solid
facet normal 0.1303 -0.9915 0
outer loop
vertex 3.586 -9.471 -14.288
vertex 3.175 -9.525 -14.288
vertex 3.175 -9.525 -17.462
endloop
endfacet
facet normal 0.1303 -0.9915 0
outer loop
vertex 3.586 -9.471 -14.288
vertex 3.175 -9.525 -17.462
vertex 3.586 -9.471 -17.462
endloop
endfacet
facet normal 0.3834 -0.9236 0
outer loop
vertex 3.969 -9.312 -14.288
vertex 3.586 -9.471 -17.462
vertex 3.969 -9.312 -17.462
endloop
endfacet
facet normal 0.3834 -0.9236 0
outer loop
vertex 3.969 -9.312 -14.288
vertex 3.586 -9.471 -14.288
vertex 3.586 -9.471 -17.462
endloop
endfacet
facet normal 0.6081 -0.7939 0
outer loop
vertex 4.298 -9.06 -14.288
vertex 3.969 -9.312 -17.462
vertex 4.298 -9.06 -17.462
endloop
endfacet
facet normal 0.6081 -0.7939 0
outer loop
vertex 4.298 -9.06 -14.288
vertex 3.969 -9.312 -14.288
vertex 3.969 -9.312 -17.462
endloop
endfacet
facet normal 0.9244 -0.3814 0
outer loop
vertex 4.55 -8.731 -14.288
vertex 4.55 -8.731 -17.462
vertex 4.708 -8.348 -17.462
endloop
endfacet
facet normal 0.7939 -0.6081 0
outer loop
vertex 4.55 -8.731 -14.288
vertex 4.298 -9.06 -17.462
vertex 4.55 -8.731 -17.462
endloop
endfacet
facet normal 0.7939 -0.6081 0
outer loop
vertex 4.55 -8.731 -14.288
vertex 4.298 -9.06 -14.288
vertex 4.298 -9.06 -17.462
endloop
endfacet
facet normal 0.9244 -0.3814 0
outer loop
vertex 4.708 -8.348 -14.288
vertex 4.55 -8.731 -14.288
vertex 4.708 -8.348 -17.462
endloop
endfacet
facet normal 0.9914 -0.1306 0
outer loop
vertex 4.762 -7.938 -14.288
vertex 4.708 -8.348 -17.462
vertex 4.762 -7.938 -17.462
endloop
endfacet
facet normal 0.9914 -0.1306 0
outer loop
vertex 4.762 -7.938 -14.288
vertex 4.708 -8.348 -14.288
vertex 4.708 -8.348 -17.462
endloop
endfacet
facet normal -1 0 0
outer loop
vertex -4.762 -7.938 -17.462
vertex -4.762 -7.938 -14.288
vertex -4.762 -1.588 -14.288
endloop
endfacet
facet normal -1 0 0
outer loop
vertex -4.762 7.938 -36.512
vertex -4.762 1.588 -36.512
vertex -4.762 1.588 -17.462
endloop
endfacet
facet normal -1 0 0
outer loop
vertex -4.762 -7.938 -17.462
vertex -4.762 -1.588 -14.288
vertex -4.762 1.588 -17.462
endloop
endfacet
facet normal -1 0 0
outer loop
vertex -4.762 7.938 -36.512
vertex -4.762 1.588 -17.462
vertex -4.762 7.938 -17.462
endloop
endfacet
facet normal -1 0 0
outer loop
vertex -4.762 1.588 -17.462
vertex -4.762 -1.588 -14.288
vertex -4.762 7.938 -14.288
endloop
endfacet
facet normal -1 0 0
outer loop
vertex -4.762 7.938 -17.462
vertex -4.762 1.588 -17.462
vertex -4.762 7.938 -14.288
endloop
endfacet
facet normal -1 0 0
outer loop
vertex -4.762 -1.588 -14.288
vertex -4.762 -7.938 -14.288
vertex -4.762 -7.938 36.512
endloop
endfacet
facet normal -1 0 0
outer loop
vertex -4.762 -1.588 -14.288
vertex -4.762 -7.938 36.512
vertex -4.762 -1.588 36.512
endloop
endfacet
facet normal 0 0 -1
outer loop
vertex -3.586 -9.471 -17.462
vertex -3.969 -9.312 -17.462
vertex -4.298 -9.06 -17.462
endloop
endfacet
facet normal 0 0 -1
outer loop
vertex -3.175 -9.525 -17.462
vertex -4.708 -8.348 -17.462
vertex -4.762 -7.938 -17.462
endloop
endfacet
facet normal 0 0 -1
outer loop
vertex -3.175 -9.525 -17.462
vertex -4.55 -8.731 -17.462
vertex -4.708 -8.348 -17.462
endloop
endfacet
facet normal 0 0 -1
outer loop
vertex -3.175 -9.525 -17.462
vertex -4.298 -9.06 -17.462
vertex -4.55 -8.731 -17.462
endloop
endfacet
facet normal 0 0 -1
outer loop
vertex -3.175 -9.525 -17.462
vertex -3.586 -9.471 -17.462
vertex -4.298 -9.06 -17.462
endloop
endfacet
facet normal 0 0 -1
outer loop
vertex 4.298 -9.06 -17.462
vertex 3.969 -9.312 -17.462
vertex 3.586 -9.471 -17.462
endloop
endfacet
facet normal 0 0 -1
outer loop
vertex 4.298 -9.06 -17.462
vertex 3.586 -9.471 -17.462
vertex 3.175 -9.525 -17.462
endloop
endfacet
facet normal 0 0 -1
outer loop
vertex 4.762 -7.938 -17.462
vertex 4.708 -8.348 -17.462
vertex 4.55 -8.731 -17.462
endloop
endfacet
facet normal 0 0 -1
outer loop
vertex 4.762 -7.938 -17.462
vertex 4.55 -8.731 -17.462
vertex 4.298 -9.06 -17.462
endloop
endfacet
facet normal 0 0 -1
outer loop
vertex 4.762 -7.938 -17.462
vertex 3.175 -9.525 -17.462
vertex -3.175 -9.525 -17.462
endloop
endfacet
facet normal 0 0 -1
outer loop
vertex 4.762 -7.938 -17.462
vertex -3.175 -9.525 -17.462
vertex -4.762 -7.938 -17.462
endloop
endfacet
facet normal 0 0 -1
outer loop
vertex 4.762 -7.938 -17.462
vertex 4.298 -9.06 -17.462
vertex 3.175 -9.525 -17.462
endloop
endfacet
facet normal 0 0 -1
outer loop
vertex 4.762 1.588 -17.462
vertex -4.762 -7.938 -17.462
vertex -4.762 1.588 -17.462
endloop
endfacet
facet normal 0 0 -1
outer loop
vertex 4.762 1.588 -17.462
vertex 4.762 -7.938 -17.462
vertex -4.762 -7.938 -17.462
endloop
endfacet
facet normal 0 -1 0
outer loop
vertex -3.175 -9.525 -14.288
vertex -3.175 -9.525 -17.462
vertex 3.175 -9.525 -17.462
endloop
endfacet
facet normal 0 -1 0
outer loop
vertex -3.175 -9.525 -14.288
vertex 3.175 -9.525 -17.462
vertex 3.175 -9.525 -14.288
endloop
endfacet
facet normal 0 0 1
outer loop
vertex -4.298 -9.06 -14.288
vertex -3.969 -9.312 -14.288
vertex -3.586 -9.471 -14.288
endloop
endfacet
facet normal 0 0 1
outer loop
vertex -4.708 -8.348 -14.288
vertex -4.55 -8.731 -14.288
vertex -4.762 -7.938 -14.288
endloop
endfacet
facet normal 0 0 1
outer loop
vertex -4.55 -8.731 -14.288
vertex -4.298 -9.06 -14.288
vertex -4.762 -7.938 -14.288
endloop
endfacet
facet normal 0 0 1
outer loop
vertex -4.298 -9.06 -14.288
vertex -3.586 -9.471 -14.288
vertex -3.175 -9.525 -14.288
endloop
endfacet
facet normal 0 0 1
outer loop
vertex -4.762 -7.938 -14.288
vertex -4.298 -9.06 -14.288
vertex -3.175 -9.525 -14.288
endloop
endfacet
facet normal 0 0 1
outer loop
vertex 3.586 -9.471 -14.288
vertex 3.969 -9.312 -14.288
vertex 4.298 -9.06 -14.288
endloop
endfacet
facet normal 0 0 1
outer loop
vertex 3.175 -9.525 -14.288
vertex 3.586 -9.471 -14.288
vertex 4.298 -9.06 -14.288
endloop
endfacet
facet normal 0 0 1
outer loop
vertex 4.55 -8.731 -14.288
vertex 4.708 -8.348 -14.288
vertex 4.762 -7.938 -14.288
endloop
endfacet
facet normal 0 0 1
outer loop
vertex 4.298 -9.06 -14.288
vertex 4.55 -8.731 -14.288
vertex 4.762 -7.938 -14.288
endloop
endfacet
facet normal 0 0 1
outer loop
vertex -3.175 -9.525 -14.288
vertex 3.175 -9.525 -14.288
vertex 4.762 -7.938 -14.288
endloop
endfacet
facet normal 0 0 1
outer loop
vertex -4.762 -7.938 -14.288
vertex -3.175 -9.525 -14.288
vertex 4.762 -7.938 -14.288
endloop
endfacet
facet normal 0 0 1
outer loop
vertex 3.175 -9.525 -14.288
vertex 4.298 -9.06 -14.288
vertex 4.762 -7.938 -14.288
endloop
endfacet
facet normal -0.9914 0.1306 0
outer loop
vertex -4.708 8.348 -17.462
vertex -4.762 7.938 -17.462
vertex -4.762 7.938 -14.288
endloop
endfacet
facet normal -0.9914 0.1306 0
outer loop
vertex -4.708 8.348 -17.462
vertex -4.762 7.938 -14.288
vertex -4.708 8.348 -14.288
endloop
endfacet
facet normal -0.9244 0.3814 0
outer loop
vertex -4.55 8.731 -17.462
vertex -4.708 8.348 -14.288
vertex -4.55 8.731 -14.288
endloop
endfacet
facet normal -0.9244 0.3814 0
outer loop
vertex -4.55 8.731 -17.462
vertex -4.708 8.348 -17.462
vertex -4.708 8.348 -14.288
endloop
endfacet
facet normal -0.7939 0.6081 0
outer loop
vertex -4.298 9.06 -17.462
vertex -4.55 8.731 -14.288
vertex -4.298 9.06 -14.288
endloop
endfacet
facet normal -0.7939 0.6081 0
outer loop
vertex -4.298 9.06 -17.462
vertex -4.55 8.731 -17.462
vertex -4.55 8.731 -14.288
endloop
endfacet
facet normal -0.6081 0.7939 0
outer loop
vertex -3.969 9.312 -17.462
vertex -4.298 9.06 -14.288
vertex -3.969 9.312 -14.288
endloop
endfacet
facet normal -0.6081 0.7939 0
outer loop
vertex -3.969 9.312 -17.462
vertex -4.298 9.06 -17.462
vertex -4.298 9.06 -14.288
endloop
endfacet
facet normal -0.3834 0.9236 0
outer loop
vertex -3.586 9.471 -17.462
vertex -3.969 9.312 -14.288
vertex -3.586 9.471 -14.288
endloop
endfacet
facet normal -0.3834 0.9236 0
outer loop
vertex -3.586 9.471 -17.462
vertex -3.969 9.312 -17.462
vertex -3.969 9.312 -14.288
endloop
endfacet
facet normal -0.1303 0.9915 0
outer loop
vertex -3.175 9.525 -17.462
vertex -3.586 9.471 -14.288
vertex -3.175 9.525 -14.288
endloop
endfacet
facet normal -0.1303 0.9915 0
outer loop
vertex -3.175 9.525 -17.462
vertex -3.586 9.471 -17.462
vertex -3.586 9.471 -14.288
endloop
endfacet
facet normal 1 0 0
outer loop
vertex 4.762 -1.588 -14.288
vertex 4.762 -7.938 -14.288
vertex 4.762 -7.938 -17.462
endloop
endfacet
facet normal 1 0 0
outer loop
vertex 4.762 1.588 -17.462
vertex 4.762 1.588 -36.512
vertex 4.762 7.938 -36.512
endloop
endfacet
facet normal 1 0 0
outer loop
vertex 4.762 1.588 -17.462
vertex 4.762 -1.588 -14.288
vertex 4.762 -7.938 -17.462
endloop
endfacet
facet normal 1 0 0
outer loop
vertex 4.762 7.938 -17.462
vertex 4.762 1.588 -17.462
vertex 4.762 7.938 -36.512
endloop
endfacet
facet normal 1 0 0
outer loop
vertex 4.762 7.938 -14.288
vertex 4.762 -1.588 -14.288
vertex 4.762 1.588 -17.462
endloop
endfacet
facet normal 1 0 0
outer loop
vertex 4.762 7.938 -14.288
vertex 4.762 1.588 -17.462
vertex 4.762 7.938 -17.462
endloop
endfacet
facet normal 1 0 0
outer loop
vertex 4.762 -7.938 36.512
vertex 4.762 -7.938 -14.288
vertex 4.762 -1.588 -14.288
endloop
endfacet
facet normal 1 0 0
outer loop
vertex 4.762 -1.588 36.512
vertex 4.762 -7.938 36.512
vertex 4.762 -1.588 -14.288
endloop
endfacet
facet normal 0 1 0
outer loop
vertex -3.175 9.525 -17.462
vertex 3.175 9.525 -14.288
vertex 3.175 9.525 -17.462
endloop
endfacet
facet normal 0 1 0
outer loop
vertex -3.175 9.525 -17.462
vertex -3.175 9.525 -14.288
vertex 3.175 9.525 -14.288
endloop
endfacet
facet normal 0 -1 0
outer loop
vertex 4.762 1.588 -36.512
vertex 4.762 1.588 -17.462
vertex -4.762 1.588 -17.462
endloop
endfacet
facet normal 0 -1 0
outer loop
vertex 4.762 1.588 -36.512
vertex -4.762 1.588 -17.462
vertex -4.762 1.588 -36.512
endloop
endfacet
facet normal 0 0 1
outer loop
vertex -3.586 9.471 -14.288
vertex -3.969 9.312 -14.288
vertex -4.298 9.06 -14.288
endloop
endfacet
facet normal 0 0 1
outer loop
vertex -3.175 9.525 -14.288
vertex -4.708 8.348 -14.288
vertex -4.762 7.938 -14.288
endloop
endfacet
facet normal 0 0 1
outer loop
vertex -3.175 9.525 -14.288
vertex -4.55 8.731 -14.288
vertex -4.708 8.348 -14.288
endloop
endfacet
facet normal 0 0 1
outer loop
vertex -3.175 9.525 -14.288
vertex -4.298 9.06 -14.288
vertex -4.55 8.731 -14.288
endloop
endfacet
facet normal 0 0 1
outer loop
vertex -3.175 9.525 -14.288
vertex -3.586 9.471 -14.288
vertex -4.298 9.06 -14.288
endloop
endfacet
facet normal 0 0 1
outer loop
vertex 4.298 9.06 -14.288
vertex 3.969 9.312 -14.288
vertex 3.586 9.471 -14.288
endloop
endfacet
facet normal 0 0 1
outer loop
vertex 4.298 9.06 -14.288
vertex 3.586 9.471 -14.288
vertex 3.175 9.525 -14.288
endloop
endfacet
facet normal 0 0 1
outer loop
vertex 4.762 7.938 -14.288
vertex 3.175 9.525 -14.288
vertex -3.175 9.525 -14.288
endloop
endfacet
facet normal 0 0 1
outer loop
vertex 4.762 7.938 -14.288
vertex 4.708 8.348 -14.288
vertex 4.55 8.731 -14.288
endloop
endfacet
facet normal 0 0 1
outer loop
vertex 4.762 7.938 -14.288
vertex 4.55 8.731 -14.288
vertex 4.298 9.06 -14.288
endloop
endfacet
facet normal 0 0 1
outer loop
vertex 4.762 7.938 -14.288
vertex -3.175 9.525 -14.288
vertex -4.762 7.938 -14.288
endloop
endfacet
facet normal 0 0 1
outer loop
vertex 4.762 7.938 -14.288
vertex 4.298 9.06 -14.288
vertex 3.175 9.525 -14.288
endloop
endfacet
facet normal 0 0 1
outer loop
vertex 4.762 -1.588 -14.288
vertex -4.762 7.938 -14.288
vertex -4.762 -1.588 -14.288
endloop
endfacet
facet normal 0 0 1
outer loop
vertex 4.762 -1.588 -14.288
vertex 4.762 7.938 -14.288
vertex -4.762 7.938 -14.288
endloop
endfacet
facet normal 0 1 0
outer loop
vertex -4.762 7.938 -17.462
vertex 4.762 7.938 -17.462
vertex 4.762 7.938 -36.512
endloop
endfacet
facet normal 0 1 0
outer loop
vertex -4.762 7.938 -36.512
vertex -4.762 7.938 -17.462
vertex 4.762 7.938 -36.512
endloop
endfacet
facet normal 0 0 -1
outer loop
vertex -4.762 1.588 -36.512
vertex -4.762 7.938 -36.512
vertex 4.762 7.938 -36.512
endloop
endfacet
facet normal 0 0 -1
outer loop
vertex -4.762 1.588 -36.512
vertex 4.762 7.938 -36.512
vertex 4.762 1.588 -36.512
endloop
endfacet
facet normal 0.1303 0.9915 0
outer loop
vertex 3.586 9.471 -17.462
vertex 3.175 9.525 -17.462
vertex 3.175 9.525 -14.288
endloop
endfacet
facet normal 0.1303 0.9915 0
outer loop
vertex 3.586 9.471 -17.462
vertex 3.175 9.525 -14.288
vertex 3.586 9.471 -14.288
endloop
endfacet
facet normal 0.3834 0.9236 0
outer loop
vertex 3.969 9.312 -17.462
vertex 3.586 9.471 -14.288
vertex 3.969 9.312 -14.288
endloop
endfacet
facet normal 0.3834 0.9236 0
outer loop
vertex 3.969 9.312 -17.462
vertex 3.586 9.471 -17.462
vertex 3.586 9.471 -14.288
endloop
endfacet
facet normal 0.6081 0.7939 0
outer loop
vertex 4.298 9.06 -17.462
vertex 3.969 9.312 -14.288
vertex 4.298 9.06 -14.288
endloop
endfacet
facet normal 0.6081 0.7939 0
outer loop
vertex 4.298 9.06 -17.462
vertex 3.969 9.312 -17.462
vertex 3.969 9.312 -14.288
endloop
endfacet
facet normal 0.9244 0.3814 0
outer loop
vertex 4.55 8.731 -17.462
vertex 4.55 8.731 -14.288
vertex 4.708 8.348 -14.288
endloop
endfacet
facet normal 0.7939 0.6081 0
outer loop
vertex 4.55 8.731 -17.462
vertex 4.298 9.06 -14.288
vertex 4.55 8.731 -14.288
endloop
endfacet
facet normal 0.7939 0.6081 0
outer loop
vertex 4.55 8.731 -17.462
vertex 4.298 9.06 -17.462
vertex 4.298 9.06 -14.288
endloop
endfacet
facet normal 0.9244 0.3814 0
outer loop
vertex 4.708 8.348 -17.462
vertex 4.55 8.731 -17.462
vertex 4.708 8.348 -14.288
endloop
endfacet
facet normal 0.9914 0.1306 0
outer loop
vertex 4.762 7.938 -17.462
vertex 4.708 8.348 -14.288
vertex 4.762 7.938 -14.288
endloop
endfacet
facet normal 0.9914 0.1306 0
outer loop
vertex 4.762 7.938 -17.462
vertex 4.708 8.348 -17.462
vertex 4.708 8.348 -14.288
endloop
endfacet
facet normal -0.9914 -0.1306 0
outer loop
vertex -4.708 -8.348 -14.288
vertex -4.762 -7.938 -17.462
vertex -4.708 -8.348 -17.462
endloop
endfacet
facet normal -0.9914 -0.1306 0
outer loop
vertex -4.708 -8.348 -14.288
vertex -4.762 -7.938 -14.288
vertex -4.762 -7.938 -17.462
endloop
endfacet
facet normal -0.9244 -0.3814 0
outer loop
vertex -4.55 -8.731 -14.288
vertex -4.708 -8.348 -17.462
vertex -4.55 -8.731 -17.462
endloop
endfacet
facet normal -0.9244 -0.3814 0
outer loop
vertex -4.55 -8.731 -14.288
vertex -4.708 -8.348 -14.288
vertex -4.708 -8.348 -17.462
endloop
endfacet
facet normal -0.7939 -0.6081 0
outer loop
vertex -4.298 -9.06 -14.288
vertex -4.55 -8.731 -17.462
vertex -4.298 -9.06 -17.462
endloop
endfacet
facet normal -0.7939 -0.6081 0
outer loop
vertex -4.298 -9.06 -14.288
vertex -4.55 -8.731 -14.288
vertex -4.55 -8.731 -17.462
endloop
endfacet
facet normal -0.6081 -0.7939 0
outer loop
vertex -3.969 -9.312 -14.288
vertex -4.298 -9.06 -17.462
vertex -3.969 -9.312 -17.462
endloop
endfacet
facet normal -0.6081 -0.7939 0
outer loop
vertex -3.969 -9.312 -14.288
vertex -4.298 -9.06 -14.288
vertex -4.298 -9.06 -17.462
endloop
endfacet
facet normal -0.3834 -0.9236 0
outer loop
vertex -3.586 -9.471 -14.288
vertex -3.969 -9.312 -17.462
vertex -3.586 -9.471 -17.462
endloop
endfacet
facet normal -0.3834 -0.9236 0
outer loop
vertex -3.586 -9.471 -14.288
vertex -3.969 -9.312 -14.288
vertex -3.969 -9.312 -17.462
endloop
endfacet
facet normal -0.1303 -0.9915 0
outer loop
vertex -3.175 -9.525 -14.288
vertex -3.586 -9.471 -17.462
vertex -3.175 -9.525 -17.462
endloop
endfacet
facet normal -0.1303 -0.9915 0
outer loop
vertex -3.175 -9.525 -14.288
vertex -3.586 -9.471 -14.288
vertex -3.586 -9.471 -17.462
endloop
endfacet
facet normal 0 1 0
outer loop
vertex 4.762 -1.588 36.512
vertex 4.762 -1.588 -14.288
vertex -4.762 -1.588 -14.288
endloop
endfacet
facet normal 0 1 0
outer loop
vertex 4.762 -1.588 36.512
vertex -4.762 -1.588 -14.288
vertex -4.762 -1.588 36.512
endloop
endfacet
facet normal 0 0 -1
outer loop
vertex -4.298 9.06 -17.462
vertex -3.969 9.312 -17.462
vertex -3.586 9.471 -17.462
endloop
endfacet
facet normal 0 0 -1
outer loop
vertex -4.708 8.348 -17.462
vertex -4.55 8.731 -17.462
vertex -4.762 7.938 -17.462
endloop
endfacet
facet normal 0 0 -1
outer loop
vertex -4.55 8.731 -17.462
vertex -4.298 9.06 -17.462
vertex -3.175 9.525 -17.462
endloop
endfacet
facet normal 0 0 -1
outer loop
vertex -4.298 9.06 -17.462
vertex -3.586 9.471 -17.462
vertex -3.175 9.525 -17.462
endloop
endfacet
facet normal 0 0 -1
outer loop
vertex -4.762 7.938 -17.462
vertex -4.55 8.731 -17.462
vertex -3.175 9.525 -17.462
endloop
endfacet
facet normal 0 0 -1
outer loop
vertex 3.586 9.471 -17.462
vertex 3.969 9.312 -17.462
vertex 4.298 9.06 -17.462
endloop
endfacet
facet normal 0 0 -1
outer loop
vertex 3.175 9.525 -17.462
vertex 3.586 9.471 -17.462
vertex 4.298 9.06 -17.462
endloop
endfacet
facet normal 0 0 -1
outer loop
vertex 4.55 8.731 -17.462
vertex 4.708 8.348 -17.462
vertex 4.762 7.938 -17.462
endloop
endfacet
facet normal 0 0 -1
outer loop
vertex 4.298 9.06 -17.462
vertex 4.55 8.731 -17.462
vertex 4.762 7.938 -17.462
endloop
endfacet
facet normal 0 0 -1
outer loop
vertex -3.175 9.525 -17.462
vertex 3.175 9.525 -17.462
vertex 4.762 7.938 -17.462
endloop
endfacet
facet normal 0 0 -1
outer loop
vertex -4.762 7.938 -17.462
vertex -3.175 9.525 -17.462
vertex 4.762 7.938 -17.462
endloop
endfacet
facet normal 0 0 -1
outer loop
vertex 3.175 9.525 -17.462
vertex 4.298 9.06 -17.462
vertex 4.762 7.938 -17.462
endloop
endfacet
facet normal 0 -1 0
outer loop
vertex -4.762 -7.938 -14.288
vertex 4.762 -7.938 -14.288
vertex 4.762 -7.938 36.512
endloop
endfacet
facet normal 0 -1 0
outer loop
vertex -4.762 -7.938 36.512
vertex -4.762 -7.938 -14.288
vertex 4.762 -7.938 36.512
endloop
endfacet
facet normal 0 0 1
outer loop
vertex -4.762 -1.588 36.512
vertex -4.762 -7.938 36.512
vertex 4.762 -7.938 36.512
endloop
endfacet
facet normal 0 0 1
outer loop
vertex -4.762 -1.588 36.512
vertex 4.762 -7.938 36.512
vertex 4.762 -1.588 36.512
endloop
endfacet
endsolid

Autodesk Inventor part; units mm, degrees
ref_plane "YZ Plane" through (0, 0, 0) normal (1, 0, 0) x (0, 1, 0)
ref_plane "XZ Plane" through (0, 0, 0) normal (0, 1, 0) x (-1, 0, 0)
ref_plane "XY Plane" through (0, 0, 0) normal (0, 0, 1) x (1, 0, 0)
sketch "Sketch1" plane through (0, 0, 0) normal (1, 0, 0) x (0, 1, 0)
  line L0 (-9.525, 36.5125) -> (9.525, 36.5125)
  line L1 (9.525, 36.5125) -> (9.525, -36.5125)
  line L2 (9.525, -36.5125) -> (-9.525, -36.5125)
  line L3 (-9.525, -36.5125) -> (-9.525, 36.5125)
  line L4 (-9.525, 36.5125) -> (9.525, -36.5125) construction
  line L5 (9.525, 36.5125) -> (-9.525, -36.5125) construction
  point P0 (0, 0)
  dimension "d0" = 19.05
  dimension "d1" = 73.025
extrude "Extrusion1" add sketch "Sketch1" along normal mid plane 9.525
sketch "Sketch2" plane through (4.7625, 0, 0) normal (1, 0, 0) x (0, 0, -1)
  line L0 (-36.5125, 9.525) -> (-36.5125, -9.525) projected
  line L1 (-36.5125, 9.525) -> (14.2875, 9.525)
  line L2 (14.2875, 9.525) -> (14.2875, -1.5875)
  line L3 (14.2875, -1.5875) -> (-36.5125, -1.5875)
  line L4 (-36.5125, -1.5875) -> (-36.5125, 9.525)
  line L5 (-36.5125, -9.525) -> (36.5125, -9.525) projected
  point P0 (0, 0)
  dimension "d4" = 50.8
  dimension "d6" = 7.9375
extrude "Extrusion2" cut sketch "Sketch2" against normal blind 9.525
sketch "Sketch3" plane through (4.7625, 0, 0) normal (1, 0, 0) x (0, 0, -1)
  line L0 (36.5125, -9.525) -> (-36.5125, -9.525) projected
  line L1 (36.5125, -9.525) -> (17.4625, -9.525)
  line L2 (17.4625, -9.525) -> (17.4625, 1.5875)
  line L3 (17.4625, 1.5875) -> (36.5125, 1.5875)
  line L4 (36.5125, 1.5875) -> (36.5125, -9.525)
  line L5 (14.2875, 9.525) -> (14.2875, -1.5875) projected
  line L6 (36.5125, 9.525) -> (14.2875, 9.525) projected
  point P0 (0, 0)
  dimension "d9" = 3.175
  dimension "d10" = 7.9375
extrude "Extrusion3" cut sketch "Sketch3" against normal blind 9.525
sketch "Sketch4" plane through (4.7625, 0, 0) normal (1, 0, 0) x (0, 0, -1)
  line L0 (-36.5125, -1.5875) -> (-36.5125, -9.525) projected
  line L1 (-36.5125, -9.525) -> (14.2875, -9.525)
  line L2 (14.2875, -9.525) -> (14.2875, -7.9375)
  line L3 (14.2875, -7.9375) -> (-36.5125, -7.9375)
  line L4 (-36.5125, -7.9375) -> (-36.5125, -9.525)
  point P0 (0, 0)
  dimension "d13" = 50.8
  dimension "d14" = 1.5875
extrude "Extrusion4" cut sketch "Sketch4" against normal blind 9.525
sketch "Sketch5" plane through (4.7625, 0, 0) normal (1, 0, 0) x (0, 0, -1)
  line L0 (36.5125, 9.525) -> (36.5125, 1.5875) projected
  line L1 (36.5125, 9.525) -> (17.4625, 9.525)
  line L2 (17.4625, 9.525) -> (17.4625, 7.9375)
  line L3 (17.4625, 7.9375) -> (36.5125, 7.9375)
  line L4 (36.5125, 7.9375) -> (36.5125, 9.525)
  point P0 (0, 0)
  dimension "d17" = 19.05
  dimension "d18" = 1.5875
extrude "Extrusion5" cut sketch "Sketch5" against normal blind 9.525
fillet "Fillet1" radius 1.5875 4 edges at (4.7625, 9.525, -15.875) (-4.7625, 9.525, -15.875) (4.7625, -9.525, -15.875) (-4.7625, -9.525, -15.875)
properties part number "CrankShaft Mill"
